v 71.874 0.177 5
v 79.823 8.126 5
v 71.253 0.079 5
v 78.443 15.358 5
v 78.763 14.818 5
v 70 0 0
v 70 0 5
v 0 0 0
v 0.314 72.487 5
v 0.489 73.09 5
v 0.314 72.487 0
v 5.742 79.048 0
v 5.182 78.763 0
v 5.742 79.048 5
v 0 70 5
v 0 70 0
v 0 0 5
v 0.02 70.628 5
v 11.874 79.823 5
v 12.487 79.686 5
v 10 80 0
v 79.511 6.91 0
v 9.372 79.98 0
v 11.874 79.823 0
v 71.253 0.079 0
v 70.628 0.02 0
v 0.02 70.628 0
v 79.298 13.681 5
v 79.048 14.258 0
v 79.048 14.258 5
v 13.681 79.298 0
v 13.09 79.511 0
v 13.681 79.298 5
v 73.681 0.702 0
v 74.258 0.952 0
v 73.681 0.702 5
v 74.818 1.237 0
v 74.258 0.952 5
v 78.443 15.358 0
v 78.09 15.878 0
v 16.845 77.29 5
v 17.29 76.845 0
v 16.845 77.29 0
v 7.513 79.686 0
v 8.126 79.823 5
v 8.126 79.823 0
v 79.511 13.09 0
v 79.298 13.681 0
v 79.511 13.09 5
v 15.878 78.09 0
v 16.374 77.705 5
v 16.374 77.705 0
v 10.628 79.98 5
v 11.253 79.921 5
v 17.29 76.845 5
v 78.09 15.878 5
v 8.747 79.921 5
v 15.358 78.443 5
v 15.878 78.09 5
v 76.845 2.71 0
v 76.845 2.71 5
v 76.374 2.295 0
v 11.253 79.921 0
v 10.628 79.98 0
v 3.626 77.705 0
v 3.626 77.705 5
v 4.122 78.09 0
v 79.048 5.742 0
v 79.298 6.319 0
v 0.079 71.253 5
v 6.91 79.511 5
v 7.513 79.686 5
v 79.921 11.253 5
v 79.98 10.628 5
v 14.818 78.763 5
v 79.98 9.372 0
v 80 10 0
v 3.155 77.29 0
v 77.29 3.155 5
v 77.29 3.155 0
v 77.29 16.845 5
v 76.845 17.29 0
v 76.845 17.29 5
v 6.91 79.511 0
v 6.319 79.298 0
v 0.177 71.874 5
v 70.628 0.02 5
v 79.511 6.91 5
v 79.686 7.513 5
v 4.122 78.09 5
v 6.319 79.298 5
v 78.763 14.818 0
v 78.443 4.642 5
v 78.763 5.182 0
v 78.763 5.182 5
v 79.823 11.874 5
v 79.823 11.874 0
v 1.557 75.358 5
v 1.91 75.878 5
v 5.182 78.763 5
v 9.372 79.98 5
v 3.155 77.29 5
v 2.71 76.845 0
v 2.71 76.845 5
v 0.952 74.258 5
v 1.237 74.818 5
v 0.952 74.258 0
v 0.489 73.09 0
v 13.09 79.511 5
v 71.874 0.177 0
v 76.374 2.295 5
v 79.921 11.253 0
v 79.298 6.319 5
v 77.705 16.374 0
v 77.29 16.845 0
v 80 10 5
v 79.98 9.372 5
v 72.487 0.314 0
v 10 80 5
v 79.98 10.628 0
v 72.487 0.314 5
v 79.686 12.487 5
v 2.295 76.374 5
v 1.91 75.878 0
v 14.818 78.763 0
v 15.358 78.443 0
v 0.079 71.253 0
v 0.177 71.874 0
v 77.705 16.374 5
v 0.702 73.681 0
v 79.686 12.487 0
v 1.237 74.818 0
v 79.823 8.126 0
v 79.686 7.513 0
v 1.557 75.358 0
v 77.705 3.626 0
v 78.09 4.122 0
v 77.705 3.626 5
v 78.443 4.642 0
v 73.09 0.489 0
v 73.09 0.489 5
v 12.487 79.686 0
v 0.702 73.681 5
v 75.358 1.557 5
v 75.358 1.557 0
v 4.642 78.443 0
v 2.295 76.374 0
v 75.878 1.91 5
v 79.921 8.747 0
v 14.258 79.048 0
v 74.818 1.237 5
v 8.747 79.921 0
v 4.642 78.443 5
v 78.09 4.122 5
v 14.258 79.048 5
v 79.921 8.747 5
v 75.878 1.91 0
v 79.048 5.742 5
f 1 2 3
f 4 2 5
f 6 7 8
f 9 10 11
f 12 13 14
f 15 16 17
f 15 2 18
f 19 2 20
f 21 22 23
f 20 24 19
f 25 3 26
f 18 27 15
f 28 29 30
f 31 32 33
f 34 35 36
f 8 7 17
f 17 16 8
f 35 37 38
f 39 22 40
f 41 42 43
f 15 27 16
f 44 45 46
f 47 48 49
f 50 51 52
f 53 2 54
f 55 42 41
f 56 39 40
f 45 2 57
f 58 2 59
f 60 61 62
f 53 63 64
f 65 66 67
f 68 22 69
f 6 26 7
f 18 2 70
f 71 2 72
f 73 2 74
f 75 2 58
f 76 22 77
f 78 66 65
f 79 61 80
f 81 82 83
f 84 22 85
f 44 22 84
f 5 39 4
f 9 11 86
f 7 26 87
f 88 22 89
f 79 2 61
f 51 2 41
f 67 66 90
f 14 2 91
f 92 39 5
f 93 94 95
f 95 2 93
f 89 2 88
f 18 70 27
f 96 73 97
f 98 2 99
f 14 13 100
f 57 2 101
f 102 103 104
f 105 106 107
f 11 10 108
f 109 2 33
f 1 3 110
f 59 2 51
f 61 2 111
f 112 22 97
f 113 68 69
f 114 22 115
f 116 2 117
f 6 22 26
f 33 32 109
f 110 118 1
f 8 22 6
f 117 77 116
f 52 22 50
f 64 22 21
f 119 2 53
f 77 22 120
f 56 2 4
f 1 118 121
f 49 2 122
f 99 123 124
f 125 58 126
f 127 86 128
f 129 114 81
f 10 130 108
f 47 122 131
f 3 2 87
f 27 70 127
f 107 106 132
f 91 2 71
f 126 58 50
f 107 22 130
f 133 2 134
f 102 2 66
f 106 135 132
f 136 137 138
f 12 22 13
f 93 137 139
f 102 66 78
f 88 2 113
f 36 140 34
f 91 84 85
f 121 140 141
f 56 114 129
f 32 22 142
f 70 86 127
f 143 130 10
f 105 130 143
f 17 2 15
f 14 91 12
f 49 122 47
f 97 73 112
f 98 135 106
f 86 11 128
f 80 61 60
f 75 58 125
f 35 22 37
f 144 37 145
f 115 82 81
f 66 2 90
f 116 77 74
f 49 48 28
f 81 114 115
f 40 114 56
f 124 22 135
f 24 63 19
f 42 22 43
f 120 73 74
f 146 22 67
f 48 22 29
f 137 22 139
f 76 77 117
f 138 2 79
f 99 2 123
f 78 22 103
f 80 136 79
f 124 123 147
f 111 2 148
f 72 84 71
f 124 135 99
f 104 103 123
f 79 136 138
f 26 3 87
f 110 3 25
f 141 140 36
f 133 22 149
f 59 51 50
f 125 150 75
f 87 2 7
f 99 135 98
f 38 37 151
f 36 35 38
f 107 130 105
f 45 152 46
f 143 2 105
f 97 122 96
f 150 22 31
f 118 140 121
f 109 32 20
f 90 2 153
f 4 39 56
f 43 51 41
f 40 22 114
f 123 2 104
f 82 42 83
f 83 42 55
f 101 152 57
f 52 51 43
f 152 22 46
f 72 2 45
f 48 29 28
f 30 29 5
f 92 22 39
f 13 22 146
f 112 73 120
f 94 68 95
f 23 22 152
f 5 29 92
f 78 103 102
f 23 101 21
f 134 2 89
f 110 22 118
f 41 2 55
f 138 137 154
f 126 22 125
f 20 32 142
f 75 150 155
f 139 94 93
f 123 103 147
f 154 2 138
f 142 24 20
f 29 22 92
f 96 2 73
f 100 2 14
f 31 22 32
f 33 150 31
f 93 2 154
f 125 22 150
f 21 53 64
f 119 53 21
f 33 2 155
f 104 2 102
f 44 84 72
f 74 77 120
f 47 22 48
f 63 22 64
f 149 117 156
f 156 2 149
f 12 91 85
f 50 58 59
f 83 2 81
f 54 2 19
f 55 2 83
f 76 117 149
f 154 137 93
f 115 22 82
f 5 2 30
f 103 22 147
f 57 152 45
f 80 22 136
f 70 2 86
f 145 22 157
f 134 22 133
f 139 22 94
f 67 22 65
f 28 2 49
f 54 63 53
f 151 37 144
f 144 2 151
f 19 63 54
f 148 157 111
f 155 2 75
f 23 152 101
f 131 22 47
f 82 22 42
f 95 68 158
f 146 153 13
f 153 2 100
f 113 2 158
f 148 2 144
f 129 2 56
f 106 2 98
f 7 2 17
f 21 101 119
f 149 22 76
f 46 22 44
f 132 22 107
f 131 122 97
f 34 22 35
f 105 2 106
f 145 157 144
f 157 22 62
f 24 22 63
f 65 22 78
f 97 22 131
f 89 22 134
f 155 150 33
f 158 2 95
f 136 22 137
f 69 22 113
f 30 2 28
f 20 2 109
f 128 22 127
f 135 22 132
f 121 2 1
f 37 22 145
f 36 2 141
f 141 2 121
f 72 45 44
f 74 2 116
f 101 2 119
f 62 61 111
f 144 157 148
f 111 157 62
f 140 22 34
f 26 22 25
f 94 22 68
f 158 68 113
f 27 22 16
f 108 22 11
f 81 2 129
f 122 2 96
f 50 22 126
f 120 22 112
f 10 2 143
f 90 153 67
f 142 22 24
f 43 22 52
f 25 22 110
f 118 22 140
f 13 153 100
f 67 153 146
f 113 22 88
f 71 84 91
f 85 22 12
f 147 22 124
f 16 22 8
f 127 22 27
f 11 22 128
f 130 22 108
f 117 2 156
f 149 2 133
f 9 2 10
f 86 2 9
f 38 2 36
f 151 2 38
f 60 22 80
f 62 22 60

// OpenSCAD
$fn = 100;

hull() {
    cube([20, 20, 5]);
    translate([70, 10, 0])
    cylinder( r=10, h=5);
    translate([10, 70, 0])
    cylinder( r=10, h=5);
}
